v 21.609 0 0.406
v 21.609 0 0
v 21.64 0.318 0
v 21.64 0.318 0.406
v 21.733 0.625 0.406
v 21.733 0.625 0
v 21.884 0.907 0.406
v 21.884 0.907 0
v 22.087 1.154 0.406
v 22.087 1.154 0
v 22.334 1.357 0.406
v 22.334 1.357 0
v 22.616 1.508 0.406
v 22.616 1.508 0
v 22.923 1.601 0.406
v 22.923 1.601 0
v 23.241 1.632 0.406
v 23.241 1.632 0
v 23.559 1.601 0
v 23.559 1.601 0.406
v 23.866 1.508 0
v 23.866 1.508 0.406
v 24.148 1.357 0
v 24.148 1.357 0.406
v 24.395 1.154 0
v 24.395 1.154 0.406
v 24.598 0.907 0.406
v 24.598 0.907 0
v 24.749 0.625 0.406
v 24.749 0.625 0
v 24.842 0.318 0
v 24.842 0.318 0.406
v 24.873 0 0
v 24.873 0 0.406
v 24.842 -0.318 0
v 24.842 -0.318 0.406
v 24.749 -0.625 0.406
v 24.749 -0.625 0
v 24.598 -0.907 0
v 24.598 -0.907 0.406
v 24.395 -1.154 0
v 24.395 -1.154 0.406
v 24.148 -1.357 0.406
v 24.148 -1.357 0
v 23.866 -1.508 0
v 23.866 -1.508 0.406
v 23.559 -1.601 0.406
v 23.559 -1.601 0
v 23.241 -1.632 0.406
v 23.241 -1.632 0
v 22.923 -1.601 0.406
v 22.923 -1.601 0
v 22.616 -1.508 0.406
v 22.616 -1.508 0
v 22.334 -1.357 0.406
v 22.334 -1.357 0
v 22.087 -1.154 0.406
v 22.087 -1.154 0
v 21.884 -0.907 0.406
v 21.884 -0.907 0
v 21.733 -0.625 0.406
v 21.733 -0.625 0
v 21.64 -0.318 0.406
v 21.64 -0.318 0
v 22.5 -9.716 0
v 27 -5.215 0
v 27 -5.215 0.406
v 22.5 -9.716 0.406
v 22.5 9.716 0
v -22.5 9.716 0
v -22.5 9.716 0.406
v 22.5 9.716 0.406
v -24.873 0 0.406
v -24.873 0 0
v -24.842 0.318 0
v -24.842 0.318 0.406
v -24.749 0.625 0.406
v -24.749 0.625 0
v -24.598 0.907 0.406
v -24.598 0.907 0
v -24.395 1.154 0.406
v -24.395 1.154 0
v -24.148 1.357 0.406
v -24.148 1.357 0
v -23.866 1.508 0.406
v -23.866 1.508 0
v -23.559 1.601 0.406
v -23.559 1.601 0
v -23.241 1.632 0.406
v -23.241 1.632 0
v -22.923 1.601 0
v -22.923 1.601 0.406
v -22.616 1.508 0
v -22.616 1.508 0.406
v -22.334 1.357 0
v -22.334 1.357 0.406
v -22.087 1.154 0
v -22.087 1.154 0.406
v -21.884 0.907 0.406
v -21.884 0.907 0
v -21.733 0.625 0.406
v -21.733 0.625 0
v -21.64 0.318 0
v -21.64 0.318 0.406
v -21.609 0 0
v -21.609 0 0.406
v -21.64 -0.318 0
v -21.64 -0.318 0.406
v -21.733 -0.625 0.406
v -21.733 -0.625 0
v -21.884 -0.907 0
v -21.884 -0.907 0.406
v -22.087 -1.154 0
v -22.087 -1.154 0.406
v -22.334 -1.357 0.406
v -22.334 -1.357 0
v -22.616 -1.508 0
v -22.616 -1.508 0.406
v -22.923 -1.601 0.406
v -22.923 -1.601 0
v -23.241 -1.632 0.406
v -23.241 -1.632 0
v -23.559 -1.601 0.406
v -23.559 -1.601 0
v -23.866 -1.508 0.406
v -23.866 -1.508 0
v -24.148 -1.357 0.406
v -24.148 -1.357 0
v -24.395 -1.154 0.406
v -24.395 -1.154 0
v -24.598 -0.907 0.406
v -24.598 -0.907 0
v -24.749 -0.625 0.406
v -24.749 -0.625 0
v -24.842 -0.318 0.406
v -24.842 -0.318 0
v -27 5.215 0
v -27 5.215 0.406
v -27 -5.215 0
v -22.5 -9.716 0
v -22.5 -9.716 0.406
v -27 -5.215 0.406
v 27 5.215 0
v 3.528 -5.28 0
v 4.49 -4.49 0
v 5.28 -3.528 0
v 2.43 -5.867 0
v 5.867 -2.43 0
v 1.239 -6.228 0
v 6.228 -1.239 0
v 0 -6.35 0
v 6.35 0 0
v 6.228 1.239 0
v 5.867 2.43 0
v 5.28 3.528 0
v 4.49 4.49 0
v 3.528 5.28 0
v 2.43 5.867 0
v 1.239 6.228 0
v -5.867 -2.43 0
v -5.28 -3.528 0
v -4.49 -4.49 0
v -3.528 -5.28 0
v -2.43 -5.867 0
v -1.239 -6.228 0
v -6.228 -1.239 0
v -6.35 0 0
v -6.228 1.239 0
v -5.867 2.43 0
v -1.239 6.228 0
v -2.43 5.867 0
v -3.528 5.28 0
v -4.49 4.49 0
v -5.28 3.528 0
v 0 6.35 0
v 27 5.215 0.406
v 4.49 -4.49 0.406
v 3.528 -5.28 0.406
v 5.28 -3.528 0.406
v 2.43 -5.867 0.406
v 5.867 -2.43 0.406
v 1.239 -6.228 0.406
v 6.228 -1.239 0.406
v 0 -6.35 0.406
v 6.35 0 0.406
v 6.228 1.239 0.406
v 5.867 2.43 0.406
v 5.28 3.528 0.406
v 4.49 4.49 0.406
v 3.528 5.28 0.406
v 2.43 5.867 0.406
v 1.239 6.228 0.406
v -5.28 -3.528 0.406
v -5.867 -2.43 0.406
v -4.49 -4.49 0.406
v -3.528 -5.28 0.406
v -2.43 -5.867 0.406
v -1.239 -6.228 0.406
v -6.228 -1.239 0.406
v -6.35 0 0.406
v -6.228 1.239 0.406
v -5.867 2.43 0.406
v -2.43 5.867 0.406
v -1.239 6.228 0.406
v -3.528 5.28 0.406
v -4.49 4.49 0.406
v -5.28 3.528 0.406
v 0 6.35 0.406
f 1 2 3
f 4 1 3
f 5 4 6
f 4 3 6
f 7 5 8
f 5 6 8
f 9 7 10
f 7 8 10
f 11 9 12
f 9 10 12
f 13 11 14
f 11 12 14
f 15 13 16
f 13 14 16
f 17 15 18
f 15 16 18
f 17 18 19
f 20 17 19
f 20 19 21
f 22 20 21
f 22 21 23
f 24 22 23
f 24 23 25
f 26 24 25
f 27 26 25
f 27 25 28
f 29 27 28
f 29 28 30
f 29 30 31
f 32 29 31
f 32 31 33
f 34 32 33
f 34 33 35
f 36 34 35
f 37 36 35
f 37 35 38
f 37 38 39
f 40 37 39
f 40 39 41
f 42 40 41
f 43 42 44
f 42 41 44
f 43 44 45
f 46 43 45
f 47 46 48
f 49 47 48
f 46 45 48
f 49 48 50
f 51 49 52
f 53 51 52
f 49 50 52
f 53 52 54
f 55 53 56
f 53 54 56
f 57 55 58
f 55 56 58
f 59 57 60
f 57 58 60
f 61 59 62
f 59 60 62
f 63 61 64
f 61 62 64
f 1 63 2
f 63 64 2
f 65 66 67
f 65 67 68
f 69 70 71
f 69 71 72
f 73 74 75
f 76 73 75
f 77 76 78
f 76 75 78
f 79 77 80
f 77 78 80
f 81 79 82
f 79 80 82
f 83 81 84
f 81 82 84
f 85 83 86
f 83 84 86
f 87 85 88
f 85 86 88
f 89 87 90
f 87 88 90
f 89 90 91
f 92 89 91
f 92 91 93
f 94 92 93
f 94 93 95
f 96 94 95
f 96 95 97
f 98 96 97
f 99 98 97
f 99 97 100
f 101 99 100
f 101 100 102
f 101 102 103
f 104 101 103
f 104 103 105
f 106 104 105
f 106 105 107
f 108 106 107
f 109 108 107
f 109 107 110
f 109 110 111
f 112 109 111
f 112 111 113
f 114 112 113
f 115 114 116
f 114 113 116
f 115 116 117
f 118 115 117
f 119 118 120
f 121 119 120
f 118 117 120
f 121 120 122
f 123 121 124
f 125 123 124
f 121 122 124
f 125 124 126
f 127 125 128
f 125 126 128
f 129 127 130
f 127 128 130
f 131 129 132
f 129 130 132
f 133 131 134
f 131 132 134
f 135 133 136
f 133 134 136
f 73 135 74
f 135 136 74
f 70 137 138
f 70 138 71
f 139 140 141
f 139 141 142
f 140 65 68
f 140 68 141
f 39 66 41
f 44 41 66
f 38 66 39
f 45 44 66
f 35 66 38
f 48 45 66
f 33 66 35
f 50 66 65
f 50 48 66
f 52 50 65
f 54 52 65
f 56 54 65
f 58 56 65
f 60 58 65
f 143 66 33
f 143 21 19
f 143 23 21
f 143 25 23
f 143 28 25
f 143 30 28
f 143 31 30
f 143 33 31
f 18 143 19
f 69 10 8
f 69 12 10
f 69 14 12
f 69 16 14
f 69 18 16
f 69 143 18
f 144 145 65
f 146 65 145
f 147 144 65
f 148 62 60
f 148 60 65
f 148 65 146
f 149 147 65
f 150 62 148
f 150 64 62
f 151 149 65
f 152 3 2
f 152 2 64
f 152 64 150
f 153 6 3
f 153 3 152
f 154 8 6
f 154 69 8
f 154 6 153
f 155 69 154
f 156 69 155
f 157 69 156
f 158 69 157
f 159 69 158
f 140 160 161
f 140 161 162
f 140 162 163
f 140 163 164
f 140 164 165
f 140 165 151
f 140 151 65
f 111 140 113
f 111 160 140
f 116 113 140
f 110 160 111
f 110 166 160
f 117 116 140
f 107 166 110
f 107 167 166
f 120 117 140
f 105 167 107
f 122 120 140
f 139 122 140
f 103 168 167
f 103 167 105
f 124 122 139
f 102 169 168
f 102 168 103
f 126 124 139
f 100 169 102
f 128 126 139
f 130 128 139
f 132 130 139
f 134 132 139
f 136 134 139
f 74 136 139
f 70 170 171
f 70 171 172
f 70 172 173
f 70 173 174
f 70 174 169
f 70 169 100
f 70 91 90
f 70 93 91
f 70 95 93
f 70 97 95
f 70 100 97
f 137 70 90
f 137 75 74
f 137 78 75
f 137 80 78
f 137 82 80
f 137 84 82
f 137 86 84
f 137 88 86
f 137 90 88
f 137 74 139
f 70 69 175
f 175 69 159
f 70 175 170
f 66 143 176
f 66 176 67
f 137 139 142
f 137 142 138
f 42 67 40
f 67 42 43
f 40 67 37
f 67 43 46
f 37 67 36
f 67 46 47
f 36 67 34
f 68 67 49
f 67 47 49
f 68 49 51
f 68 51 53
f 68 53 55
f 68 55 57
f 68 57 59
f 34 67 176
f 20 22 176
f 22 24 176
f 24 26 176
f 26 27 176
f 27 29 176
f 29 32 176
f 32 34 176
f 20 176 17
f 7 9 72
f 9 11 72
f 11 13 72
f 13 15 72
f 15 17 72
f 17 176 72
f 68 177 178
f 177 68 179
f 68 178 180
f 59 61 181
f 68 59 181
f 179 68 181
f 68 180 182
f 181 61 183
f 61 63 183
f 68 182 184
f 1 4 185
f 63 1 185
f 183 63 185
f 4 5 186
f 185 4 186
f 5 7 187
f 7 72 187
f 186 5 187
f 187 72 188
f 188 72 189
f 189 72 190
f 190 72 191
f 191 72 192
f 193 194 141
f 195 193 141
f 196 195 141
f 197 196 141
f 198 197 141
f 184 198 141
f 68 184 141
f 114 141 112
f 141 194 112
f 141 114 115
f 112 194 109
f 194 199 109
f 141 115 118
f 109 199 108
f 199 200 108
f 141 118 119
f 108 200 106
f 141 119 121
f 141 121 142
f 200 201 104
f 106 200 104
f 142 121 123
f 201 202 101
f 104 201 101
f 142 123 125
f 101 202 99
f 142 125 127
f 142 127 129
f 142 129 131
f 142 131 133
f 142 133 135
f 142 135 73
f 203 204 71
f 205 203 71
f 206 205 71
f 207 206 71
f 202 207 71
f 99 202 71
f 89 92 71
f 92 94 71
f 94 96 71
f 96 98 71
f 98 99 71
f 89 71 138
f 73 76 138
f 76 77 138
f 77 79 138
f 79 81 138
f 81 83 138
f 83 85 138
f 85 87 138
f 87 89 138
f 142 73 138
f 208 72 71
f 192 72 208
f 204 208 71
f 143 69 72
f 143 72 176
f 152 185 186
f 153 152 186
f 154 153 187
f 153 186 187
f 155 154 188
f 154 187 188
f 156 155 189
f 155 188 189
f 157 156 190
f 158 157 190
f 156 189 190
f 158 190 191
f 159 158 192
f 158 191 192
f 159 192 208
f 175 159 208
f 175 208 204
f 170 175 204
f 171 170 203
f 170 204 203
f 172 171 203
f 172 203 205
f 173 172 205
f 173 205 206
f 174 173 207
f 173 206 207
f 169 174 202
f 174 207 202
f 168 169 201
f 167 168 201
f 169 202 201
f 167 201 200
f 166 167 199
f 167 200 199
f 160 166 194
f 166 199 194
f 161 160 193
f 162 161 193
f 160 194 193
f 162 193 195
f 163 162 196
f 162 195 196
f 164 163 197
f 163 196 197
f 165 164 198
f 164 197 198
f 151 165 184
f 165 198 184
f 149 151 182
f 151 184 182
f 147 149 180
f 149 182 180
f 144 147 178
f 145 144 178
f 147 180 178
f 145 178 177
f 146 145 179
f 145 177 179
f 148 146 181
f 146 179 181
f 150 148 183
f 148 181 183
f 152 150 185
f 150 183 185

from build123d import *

# Parameters (mm, degrees)
BOSS_EXTRUDE1_DEPTH   = 0.4064
F_4_CLEARANCE_HOLE1_D = 3.2639
SKETCH5_R             = 6.35
CUT_EXTRUDE1_DEPTH    = 0.4064


with BuildPart() as part:
    # Sketch1 → Boss-Extrude1 (new body)
    with BuildSketch(Plane.XY):
        Polygon((22.499532885, 9.7155), (27.0002, 5.214832885), (27.0002, -5.214832885), (22.499532885, -9.7155), (-22.499532885, -9.7155), (-27.0002, -5.214832885), (-27.0002, 5.214832885), (-22.499532885, 9.7155), align=None)
    extrude(amount=BOSS_EXTRUDE1_DEPTH)

    # #4 Clearance Hole1 (through all)
    with Locations(Plane.XY.offset(0.4064)):
        with Locations((-23.241, 0), (23.241, 0)):
            Hole(F_4_CLEARANCE_HOLE1_D / 2)

    # Sketch5 → Cut-Extrude1 (cut)
    with BuildSketch(Plane.XY.offset(0.4064)):
        Circle(SKETCH5_R)
    extrude(amount=-CUT_EXTRUDE1_DEPTH, mode=Mode.SUBTRACT)


solid = part.part
